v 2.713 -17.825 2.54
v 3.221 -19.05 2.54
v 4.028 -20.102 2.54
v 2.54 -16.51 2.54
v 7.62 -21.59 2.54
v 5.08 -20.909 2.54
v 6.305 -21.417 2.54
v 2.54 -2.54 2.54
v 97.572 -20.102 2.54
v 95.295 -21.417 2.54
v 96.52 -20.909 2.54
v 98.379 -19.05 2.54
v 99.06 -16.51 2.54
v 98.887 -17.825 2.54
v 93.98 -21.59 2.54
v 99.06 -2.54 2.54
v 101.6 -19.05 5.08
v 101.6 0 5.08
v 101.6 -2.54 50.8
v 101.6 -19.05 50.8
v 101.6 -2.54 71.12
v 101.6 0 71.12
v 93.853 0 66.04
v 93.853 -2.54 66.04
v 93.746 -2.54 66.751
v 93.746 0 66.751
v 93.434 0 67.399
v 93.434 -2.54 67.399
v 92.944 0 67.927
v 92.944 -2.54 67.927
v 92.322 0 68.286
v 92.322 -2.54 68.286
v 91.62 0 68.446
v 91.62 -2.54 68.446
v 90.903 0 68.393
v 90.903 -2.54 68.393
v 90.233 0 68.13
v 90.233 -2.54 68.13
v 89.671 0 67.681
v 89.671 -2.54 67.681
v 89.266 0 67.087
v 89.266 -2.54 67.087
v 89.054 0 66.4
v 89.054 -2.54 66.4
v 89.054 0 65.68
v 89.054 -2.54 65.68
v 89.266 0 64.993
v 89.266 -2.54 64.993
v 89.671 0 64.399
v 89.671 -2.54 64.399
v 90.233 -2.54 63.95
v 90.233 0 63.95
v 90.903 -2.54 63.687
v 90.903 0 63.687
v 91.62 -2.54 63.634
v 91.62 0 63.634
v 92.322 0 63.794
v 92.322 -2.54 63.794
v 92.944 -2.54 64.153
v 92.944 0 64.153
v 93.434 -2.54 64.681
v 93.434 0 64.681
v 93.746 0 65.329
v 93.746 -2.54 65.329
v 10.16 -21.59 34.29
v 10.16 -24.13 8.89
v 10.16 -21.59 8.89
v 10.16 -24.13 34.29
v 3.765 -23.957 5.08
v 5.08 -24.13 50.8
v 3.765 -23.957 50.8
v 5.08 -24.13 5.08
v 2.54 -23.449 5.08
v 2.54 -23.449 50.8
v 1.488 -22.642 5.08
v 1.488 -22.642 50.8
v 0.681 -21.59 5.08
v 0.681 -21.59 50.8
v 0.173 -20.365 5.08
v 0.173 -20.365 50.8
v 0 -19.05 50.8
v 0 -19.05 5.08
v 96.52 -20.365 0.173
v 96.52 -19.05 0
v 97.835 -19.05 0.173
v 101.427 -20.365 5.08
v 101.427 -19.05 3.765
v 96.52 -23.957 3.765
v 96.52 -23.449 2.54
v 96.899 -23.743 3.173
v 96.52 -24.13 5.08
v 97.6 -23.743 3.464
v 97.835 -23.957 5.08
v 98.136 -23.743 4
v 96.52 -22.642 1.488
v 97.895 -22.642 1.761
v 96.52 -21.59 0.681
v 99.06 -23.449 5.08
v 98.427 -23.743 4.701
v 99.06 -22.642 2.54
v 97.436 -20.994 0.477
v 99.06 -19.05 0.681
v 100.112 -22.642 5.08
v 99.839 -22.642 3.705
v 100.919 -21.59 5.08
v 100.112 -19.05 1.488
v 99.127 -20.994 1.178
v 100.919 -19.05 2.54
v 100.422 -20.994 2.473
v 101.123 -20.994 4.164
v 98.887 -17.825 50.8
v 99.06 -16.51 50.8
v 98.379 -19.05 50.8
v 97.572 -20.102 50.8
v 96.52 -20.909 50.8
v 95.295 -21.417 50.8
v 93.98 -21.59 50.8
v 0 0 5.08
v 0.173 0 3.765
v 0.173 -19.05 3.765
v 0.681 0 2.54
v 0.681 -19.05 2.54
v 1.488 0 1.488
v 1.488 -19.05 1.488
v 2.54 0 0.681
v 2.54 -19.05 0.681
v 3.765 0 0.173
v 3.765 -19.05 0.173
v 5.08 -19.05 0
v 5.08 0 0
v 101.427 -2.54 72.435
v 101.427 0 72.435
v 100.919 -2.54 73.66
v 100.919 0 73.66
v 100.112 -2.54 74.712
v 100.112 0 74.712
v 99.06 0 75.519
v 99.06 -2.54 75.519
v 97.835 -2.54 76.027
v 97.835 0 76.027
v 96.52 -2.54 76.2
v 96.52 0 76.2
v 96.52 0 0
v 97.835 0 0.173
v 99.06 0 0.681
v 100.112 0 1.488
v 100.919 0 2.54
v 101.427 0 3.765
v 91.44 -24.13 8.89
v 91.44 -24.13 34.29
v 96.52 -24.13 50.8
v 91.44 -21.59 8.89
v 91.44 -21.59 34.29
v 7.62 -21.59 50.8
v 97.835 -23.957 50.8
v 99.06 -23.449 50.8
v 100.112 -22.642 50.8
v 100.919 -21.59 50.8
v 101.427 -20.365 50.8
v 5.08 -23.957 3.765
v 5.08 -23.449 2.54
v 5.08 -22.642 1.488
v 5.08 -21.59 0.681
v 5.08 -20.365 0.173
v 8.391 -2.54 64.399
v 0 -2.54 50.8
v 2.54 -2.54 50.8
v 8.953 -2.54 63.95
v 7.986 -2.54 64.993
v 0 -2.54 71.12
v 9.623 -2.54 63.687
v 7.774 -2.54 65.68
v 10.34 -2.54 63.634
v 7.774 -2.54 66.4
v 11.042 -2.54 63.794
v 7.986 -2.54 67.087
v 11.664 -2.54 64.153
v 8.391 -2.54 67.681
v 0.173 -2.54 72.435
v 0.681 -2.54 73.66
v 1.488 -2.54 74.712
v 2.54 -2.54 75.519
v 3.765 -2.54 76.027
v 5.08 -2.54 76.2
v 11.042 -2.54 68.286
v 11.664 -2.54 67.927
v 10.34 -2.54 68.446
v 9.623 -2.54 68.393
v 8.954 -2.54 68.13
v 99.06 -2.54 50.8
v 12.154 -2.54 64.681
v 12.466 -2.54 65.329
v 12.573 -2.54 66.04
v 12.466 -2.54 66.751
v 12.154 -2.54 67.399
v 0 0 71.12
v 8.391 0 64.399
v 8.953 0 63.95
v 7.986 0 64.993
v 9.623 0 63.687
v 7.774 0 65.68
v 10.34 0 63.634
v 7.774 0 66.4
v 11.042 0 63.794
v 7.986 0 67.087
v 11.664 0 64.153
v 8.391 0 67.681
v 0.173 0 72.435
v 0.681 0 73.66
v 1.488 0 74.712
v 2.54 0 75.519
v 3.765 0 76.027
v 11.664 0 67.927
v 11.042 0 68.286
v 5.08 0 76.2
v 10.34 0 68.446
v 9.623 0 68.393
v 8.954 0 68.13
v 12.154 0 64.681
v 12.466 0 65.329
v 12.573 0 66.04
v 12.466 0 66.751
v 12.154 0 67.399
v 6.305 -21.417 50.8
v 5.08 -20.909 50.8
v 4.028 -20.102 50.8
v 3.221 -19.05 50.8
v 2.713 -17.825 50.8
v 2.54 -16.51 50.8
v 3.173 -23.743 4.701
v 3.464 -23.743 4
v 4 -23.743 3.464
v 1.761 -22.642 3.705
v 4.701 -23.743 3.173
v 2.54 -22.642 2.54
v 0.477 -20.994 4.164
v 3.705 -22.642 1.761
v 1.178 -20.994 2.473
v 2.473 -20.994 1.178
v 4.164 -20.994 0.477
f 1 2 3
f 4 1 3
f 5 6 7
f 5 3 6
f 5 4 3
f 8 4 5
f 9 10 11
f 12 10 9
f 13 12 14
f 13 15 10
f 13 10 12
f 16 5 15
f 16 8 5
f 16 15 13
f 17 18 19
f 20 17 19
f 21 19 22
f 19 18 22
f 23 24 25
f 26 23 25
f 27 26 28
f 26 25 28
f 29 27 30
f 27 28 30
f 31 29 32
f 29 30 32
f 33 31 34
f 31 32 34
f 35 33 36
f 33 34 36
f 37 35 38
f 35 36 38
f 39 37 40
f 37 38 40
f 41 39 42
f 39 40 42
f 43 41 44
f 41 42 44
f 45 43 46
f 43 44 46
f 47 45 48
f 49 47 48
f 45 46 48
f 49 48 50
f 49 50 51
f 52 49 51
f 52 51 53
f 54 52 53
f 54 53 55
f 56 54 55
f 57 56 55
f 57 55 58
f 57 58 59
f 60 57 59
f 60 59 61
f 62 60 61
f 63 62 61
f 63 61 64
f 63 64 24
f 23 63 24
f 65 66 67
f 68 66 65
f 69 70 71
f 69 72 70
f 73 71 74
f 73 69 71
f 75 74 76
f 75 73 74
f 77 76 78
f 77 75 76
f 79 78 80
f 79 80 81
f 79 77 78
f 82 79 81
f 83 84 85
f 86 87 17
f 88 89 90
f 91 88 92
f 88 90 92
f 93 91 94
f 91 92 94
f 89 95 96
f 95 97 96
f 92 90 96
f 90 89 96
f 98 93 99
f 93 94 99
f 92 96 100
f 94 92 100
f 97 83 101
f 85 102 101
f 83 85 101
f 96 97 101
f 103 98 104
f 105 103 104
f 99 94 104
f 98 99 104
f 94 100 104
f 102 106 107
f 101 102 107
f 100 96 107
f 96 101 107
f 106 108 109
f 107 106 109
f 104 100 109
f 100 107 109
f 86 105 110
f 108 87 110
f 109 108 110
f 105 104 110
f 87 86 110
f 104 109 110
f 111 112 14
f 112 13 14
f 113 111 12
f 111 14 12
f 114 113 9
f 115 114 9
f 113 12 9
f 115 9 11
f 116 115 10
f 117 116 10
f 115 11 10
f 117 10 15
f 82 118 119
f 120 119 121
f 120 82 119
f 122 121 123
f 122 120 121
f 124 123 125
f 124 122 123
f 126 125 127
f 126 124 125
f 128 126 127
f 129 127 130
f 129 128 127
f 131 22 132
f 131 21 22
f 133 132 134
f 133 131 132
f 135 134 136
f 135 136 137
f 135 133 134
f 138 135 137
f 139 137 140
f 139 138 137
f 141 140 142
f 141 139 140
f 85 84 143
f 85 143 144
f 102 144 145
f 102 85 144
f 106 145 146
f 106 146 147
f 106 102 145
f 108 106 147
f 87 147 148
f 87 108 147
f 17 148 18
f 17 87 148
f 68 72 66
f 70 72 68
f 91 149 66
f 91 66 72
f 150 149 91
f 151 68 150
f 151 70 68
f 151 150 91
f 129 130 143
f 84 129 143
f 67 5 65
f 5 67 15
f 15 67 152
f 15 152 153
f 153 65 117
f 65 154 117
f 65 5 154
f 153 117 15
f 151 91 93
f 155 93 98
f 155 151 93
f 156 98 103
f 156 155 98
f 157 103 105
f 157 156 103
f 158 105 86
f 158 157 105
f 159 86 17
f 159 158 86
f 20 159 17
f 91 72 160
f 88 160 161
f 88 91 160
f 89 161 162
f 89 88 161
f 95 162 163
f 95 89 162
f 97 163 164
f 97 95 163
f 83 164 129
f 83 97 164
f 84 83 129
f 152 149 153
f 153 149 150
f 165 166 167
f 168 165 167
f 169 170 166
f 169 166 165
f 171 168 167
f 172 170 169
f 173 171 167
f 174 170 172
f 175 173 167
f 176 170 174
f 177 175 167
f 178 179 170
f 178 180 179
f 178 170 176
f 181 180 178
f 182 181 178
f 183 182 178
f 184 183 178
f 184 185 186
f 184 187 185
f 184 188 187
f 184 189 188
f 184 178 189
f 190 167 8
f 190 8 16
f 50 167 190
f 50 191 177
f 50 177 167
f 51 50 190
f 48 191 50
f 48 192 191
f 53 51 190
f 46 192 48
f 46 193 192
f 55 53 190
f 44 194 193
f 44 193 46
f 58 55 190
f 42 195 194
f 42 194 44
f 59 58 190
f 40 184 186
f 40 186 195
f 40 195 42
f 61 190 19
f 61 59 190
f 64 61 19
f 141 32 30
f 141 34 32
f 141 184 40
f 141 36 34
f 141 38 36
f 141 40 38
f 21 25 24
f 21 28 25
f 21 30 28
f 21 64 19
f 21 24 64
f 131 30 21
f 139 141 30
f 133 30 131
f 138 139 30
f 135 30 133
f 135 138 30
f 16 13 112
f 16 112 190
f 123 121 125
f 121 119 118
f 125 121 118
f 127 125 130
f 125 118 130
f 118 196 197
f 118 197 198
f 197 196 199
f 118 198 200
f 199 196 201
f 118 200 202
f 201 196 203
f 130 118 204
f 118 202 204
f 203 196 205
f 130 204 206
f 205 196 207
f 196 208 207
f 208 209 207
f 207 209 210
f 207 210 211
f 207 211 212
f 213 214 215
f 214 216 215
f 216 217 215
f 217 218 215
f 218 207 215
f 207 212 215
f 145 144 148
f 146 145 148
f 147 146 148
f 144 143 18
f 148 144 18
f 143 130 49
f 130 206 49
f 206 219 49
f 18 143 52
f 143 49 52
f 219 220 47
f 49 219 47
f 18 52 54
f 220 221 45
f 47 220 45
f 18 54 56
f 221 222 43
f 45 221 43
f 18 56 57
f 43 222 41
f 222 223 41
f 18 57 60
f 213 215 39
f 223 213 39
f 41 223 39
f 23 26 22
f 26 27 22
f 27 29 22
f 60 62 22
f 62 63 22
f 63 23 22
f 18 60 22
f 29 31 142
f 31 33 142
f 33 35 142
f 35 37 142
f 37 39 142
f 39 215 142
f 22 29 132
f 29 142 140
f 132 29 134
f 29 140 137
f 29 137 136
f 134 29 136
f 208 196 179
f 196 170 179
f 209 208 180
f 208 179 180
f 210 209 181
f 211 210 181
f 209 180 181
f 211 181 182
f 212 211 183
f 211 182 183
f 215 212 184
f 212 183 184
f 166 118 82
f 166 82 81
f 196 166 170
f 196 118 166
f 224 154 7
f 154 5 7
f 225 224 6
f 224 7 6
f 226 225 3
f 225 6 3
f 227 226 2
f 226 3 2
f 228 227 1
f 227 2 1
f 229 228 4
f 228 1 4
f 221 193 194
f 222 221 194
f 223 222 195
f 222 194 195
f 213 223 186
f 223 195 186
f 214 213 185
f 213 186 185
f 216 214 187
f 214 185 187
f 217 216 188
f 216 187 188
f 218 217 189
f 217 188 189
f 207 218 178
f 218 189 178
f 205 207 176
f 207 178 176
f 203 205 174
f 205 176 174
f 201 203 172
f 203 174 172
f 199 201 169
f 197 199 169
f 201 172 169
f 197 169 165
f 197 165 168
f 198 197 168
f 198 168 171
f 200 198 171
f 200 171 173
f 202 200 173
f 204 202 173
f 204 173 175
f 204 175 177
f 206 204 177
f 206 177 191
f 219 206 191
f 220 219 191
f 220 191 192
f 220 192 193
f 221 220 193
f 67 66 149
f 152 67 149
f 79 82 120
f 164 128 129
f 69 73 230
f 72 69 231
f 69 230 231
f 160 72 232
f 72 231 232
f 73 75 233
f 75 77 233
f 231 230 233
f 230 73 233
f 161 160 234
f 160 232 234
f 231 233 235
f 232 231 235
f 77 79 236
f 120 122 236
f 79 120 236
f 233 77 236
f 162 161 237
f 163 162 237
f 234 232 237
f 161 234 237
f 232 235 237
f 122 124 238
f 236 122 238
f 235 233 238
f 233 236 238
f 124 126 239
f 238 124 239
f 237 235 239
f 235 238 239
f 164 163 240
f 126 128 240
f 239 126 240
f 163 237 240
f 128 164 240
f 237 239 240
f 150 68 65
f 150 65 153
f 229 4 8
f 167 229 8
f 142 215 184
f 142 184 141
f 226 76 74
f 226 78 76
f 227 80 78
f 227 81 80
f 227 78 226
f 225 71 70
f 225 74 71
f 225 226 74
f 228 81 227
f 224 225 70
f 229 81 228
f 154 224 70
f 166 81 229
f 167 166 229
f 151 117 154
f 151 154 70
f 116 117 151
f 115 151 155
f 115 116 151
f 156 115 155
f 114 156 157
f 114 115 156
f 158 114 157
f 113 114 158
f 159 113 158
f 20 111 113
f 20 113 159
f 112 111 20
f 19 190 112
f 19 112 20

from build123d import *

# Parameters (mm, degrees)
F0_W      = 101.6
F0_H      = 76.2
F1_DEPTH  = 2.54
F2_W      = 101.6
F2_H      = 50.8
F3_DEPTH  = 21.59
F4_R      = 5.08
F5_W      = 96.52
F5_H      = 19.05
F6_DEPTH  = 48.26
F7_R      = 5.08
F8_R      = 5.08
F9_R      = 5.08
F11_W     = 81.28
F11_H     = 25.4
F12_DEPTH = 21.59
F13_R     = 2.413
F14_DEPTH = 2.541


# Not quite as in the source:
# - a feature of the source that left no trace in its solid (it failed there, or was rolled back) is left out


with BuildPart() as f1:
    # F0 (on Front) → F1 (new body)
    with BuildSketch(Plane.XZ):
        with Locations((50.8, 38.1)):
            Rectangle(F0_W, F0_H)
    extrude(amount=F1_DEPTH)

    # F2 (on face) → F3 (join)
    with BuildSketch(Plane.XZ.offset(2.54)):
        with Locations((50.8, 25.4)):
            Rectangle(F2_W, F2_H)
    extrude(amount=F3_DEPTH)

    # F4
    f4_edges = [f1.edges().sort_by_distance(p)[0] for p in [
        (101.6, -1.27, 76.2),
        (101.6, -12.065, 0),
        (0, -12.065, 0),
        (0, -1.27, 76.2),
    ]]
    fillet(f4_edges, radius=F4_R)

    # F5 (on face) → F6 (cut)
    with BuildSketch(Plane.XY.offset(50.8)):
        with Locations((50.8, -12.065)):
            Rectangle(F5_W, F5_H)
    extrude(amount=-F6_DEPTH, mode=Mode.SUBTRACT)

    # F7
    f7_edges = [f1.edges().sort_by_distance(p)[0] for p in [
        (101.6, -24.13, 27.94),
    ]]
    fillet(f7_edges, radius=F7_R)

    # F8
    f8_edges = [f1.edges().sort_by_distance(p)[0] for p in [
        (99.06, -21.59, 26.67),
    ]]
    fillet(f8_edges, radius=F8_R)

    # F9
    f9_edges = [f1.edges().sort_by_distance(p)[0] for p in [
        (2.54, -21.59, 26.67),
    ]]
    fillet(f9_edges, radius=F9_R)

    # F11 (on face) → F12 (cut, through all)
    with BuildSketch(Plane.XZ.offset(24.13)):
        with Locations((50.8, 21.59)):
            Rectangle(F11_W, F11_H)
    extrude(amount=-F12_DEPTH, mode=Mode.SUBTRACT)

    # F13 (on face) → F14 (cut, through all)
    with BuildSketch(Plane.XZ.offset(2.54)):
        with Locations((91.44, 66.04)):
            Circle(F13_R)
        with Locations((10.16, 66.04)):
            Circle(F13_R)
    extrude(amount=-F14_DEPTH, mode=Mode.SUBTRACT)


solid = f1.part
